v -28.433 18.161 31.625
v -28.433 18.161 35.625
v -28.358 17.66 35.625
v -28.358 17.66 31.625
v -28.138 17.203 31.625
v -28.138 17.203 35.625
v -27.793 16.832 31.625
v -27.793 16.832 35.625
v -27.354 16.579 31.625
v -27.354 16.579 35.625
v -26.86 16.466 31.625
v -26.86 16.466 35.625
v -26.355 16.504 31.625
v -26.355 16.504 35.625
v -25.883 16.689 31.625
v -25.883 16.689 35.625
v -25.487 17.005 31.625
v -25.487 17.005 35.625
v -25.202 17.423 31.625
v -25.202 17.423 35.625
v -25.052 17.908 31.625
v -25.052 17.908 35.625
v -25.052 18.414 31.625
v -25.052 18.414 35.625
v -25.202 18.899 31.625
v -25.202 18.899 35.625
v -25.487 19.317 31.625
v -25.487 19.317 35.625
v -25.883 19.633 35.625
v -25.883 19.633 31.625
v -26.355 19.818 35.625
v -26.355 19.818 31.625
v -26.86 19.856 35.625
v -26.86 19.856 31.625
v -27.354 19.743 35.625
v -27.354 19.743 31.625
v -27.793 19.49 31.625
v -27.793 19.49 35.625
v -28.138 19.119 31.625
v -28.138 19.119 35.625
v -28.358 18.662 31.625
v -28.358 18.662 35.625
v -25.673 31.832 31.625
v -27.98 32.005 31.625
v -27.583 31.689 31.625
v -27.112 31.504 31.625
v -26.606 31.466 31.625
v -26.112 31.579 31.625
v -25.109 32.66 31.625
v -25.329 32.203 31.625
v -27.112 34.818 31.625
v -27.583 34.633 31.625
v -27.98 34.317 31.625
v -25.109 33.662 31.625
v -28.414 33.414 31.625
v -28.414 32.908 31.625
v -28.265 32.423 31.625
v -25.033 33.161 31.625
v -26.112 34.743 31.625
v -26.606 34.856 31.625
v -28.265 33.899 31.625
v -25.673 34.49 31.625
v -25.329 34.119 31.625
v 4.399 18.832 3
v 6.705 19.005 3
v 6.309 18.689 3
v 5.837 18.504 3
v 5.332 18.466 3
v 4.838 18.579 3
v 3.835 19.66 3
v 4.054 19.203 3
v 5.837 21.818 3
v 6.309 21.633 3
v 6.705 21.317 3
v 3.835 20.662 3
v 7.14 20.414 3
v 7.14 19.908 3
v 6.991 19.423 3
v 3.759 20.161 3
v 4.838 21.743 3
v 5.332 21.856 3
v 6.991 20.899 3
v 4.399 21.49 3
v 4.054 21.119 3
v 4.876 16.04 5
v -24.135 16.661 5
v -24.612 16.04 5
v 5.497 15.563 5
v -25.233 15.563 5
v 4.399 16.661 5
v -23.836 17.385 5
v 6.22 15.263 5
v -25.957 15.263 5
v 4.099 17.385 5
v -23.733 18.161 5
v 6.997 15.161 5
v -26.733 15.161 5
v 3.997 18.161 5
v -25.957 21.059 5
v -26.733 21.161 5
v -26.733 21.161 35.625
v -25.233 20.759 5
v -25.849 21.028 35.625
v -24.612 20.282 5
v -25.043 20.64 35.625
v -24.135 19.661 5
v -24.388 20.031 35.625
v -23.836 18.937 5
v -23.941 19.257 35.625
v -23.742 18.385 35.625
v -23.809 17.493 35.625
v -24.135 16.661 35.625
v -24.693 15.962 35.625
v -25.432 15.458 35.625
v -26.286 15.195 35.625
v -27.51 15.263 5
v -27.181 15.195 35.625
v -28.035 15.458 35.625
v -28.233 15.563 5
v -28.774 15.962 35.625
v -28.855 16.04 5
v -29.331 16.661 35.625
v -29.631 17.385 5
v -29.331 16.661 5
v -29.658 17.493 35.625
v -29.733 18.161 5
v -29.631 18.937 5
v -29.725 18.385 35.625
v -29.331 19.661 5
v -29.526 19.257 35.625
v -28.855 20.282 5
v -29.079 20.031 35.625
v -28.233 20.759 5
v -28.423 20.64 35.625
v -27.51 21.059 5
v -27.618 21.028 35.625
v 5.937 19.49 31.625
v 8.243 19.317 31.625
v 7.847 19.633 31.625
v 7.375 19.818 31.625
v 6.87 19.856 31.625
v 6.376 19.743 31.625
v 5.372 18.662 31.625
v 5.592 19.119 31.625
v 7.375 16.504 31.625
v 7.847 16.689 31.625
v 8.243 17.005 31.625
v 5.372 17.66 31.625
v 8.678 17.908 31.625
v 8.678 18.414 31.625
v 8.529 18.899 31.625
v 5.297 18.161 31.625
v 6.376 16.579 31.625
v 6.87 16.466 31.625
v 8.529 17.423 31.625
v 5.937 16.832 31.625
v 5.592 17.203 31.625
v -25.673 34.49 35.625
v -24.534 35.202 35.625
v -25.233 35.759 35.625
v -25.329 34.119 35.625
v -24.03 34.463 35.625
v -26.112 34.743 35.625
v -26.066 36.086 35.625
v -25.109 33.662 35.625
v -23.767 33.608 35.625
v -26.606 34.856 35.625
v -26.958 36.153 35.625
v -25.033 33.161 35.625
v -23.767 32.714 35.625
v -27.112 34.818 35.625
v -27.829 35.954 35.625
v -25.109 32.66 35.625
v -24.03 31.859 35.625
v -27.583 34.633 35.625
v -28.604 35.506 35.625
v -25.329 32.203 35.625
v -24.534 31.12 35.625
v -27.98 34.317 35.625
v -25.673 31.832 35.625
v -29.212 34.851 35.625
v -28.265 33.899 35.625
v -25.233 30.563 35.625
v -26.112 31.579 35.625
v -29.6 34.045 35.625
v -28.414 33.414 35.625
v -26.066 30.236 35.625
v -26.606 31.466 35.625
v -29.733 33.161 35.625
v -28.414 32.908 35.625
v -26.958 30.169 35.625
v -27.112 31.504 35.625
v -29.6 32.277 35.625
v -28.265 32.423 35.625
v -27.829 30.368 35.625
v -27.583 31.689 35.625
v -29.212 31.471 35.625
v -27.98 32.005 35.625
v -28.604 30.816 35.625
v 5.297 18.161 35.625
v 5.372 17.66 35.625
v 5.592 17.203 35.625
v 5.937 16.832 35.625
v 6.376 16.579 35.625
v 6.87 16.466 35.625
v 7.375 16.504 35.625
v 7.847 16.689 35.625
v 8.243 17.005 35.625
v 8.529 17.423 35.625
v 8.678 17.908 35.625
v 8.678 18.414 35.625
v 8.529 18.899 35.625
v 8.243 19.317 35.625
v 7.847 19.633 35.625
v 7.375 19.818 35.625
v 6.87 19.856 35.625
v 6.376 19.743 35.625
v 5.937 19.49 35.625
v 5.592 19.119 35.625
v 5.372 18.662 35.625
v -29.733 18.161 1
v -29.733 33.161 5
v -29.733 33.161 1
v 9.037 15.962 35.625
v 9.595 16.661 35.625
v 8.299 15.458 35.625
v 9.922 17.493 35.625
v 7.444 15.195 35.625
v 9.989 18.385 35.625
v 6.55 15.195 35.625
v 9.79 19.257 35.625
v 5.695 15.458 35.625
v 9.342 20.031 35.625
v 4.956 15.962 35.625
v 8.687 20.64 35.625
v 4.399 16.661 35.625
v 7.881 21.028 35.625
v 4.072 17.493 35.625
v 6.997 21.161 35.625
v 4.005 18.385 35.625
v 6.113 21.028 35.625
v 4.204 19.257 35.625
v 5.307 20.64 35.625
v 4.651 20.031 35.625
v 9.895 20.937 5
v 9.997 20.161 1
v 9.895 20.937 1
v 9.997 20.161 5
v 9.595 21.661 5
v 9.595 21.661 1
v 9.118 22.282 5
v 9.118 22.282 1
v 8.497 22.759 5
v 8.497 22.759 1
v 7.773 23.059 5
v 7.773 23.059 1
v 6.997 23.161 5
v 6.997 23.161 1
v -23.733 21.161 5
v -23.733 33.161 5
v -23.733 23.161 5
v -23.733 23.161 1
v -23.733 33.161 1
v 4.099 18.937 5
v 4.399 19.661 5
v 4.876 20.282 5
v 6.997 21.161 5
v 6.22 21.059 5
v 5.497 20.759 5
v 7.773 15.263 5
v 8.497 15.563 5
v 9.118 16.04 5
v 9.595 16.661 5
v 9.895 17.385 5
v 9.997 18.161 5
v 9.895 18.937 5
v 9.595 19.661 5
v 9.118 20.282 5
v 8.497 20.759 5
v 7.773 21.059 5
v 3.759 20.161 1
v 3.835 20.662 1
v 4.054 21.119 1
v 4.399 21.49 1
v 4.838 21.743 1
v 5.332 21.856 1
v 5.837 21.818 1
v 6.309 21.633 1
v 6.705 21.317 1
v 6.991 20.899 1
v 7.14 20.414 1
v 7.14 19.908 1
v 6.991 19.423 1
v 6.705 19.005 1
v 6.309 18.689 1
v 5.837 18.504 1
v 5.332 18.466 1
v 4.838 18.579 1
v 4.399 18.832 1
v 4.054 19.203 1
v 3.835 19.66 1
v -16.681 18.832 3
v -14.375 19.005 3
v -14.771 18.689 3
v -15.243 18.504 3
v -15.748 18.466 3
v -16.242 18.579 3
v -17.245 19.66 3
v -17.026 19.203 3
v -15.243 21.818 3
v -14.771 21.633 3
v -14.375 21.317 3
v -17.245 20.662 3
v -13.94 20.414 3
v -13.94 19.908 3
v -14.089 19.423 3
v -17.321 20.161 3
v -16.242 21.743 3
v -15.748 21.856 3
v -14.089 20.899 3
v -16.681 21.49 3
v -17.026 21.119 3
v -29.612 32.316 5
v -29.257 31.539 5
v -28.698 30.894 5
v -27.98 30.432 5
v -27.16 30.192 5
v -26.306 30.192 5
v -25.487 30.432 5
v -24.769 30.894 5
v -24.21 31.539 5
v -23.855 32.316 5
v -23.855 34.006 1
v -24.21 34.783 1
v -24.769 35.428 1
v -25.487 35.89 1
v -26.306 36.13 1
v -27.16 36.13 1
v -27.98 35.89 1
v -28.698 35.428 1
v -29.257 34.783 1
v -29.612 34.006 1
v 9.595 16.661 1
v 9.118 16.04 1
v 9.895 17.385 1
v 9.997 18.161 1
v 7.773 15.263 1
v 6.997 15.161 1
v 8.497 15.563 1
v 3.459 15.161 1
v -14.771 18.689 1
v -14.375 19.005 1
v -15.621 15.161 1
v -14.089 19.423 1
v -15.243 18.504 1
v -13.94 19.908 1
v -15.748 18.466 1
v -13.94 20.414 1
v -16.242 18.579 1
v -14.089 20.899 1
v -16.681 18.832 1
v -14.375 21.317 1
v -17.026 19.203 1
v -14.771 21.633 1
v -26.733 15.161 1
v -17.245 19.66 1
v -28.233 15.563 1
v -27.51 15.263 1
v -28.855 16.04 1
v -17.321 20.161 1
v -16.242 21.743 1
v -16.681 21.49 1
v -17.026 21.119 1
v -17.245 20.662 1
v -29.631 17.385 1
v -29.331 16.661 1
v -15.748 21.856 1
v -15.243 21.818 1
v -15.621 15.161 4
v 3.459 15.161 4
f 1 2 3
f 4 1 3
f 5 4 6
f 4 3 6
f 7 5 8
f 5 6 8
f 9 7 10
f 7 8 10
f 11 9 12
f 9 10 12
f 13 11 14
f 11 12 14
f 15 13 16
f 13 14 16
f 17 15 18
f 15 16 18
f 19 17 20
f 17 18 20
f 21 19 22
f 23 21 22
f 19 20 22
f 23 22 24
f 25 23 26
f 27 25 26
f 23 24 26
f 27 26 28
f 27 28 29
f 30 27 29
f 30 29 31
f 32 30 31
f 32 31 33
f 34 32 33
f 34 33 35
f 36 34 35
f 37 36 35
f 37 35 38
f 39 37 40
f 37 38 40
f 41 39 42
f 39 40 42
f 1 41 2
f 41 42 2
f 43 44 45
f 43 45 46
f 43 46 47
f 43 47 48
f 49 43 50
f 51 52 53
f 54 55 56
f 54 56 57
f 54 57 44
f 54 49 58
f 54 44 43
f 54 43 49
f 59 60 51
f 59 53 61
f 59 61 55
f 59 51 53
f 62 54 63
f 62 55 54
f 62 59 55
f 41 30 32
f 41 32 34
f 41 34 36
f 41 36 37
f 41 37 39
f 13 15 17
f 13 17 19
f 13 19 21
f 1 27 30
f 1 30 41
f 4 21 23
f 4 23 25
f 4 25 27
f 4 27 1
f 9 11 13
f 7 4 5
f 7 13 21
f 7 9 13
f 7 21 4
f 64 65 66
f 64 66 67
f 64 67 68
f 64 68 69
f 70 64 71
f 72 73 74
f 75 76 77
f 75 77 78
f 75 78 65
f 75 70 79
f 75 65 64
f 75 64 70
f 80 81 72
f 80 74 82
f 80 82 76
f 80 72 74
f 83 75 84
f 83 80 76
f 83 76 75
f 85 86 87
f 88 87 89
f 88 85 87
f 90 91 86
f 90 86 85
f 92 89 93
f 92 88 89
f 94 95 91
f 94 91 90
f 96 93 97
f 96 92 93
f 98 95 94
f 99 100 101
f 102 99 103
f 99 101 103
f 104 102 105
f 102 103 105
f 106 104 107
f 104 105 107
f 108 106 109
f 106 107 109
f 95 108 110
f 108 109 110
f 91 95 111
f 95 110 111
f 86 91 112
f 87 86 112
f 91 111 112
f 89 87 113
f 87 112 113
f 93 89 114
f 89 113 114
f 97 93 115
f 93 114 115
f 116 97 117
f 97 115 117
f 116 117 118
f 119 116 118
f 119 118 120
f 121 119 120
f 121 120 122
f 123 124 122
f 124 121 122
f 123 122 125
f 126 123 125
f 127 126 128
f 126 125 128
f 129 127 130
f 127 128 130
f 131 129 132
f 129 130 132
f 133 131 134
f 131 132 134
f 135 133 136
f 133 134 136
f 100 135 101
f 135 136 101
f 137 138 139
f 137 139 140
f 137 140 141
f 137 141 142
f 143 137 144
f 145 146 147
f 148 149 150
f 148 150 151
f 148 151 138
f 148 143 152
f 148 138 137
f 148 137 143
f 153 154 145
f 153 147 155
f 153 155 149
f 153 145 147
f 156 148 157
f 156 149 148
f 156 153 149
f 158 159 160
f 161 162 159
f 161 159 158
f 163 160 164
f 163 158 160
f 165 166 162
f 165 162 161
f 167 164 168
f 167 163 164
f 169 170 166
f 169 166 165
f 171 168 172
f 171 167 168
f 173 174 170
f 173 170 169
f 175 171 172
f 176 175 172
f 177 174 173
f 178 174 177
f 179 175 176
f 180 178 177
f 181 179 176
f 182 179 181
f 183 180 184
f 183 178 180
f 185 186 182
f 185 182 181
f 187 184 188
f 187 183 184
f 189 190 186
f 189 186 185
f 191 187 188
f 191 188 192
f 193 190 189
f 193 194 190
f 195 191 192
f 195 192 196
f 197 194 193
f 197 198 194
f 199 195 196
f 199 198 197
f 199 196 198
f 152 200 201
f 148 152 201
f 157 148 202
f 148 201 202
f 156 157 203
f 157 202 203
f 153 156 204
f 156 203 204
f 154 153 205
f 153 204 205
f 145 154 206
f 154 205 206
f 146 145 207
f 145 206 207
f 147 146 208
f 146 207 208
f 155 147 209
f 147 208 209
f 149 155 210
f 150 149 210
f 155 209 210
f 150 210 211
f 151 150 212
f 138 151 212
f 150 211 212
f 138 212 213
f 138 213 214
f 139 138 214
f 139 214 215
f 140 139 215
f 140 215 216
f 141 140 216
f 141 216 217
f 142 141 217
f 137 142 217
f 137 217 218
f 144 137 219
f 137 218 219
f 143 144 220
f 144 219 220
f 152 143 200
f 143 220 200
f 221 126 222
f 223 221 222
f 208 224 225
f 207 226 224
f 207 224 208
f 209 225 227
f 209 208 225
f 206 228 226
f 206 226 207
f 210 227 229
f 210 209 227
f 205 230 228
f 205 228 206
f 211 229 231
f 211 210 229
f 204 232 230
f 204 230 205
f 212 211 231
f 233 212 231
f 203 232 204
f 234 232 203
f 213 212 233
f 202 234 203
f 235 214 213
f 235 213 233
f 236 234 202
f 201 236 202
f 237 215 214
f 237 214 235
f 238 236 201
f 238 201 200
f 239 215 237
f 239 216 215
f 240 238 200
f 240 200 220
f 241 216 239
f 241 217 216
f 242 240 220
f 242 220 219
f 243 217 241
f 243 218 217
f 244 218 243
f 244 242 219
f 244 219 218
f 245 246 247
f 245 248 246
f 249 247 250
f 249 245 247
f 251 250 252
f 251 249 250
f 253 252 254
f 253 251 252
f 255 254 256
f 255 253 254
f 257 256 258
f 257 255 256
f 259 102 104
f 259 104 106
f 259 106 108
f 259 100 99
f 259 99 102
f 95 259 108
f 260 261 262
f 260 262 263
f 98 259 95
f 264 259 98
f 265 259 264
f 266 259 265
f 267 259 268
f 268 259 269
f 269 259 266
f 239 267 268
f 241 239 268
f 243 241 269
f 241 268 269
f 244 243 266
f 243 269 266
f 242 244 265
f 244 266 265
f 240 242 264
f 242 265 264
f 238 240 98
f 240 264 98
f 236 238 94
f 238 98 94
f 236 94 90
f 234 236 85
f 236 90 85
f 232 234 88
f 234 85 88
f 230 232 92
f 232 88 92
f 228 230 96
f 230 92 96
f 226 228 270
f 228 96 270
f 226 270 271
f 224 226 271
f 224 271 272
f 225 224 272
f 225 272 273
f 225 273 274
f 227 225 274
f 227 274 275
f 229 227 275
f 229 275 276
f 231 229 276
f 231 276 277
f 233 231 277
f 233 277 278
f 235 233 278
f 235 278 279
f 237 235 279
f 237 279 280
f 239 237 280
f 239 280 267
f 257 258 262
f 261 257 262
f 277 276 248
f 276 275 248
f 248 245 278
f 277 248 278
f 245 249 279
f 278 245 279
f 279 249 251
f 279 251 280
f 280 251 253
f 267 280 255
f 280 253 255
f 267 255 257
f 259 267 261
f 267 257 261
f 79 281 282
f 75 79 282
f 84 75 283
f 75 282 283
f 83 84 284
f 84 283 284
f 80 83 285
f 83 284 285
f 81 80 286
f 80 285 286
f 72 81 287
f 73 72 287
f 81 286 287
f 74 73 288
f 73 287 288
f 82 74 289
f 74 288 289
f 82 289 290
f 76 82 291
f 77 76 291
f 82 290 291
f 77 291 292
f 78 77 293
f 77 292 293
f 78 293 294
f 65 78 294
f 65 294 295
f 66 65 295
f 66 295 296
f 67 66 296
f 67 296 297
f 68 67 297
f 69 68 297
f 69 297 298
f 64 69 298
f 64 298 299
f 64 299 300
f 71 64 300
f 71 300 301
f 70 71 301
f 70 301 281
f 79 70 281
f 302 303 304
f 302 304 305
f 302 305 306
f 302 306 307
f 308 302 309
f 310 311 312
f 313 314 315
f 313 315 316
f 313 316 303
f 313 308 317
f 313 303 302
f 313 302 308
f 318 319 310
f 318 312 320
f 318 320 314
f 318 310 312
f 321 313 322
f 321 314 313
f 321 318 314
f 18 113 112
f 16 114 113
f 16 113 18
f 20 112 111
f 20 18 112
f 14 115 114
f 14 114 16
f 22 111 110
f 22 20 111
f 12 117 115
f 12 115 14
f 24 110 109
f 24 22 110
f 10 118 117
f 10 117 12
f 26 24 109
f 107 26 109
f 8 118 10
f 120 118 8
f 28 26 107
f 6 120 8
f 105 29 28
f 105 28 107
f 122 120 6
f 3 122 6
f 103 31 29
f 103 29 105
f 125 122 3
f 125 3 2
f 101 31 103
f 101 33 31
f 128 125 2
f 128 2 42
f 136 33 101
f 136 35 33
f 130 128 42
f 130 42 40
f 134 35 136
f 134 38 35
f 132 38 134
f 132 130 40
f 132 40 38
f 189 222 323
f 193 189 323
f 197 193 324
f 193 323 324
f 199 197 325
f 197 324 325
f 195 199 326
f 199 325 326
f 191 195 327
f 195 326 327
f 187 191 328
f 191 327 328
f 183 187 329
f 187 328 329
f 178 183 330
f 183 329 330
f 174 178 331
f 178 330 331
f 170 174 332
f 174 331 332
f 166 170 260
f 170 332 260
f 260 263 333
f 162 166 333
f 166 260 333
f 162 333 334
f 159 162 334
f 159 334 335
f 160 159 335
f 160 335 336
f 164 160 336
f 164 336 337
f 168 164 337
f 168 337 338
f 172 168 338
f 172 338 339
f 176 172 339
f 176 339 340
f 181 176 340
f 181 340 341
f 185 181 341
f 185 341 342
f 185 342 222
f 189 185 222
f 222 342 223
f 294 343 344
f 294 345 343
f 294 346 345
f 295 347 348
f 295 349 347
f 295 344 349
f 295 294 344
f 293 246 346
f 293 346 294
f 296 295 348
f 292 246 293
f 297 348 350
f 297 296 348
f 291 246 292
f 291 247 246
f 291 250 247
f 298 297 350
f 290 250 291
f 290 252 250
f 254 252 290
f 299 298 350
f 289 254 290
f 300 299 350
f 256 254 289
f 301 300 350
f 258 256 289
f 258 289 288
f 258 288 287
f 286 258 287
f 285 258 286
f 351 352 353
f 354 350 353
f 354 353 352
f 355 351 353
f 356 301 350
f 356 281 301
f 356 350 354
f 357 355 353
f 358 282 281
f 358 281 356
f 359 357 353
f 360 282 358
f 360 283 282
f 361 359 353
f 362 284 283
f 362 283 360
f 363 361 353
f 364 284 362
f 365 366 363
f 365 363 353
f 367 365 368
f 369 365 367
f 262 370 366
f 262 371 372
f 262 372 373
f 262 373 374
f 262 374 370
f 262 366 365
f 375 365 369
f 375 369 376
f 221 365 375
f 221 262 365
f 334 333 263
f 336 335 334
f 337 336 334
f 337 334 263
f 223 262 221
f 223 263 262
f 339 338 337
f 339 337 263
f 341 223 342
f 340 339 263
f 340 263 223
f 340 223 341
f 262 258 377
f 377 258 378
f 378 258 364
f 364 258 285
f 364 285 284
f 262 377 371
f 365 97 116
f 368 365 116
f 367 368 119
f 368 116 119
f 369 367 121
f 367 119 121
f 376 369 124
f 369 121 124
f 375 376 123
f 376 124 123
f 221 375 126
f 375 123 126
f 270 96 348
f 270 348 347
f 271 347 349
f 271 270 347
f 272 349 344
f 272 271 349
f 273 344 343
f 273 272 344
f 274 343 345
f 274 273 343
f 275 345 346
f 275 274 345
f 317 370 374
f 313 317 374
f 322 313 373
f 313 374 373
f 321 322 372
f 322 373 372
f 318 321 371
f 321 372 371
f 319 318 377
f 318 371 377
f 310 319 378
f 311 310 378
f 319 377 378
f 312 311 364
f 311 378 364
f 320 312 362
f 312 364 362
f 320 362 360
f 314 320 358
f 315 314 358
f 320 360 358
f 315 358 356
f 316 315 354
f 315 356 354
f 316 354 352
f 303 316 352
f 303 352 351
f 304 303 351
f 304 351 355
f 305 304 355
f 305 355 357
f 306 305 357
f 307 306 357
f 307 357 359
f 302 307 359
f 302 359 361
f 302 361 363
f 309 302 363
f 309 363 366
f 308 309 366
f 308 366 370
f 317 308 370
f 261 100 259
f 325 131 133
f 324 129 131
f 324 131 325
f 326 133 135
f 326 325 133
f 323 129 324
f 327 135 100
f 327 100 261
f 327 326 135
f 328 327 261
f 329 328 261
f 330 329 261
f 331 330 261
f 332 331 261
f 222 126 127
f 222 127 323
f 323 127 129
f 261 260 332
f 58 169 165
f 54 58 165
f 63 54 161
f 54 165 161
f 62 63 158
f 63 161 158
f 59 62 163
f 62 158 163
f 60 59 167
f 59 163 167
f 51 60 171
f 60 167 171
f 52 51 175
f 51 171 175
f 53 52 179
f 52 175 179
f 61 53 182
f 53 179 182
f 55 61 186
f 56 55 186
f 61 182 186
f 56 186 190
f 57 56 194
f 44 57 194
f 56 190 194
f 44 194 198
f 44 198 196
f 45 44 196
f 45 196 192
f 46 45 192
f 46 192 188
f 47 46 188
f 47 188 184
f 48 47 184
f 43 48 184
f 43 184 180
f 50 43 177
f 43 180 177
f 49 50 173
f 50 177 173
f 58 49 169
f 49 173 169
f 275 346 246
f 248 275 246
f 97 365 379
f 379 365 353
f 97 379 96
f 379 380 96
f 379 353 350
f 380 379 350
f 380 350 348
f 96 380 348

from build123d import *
from build123d.topology import SkipClean

# Parameters (mm, degrees)
SKIZZE1_R                         = 3
AUFSATZ_LINEAR_AUSTRAGEN1_DEPTH   = 4
AUFSATZ_LINEAR_AUSTRAGEN1_2_DEPTH = 4
AUFSATZ_LINEAR_START              = 1
SKIZZE2_W                         = 39.730311682
SKIZZE2_H                         = 6
AUFSATZ_LINEAR_AUSTRAGEN2_DEPTH   = 4
SKIZZE3_R                         = 3
AUFSATZ_LINEAR_AUSTRAGEN3_DEPTH   = 34.6252
SCHNITT_LINEAR_AUSTRAGEN1_DEPTH   = 56.942794256
SKIZZE11_W                        = 6
SKIZZE11_H                        = 15
AUFSATZ_LINEAR_AUSTRAGEN8_DEPTH   = 4
SKIZZE12_R                        = 1.7
SCHNITT_LINEAR_AUSTRAGEN6_DEPTH   = 4
SKIZZE14_W                        = 25.08
SKIZZE14_H                        = 6
SCHNITT_LINEAR_AUSTRAGEN8_DEPTH   = 59.228840184
SKIZZE15_W                        = 33.730311682
SKIZZE15_H                        = 5
AUFSATZ_LINEAR_AUSTRAGEN9_DEPTH   = 4
SKIZZE17_R                        = 1.7
SCHNITT_LINEAR_AUSTRAGEN9_DEPTH   = 2
VERRUNDUNG1_R                     = 3


with BuildPart() as part:
    # Skizze1 → Aufsatz-Linear austragen1 (new body)
    with BuildSketch(Plane.XY):
        with Locations((-15.621, 18.161)):
            Circle(SKIZZE1_R)
    extrude(amount=AUFSATZ_LINEAR_AUSTRAGEN1_DEPTH)



with BuildPart() as body_2:
    # Skizze1 → Aufsatz-Linear austragen1 2 (new body)
    with BuildSketch(Plane.XY):
        with Locations(Location((3.459, 18.161, 0), (0, 0, 180))):
            Circle(SKIZZE1_R)
    extrude(amount=AUFSATZ_LINEAR_AUSTRAGEN1_2_DEPTH)


with BuildPart() as part_1:
    add(part.part)

    add(body_2.part)  # Aufsatz-Linear austragen2 merges body 2
    # Skizze2 → Aufsatz-Linear austragen2 (add)
    with BuildSketch(Plane.XY.offset(AUFSATZ_LINEAR_START)):
        with Locations((-9.868250172, 18.161)):
            Rectangle(SKIZZE2_W, SKIZZE2_H)
    extrude(amount=AUFSATZ_LINEAR_AUSTRAGEN2_DEPTH)

    # Skizze3 → Aufsatz-Linear austragen3 (add)
    with BuildSketch(Plane.XY.offset(1)):
        with Locations(Location((-26.733406013, 18.161, 0), (0, 0, 90))):
            Circle(SKIZZE3_R)
        with Locations(Location((6.996905669, 18.161, 0), (0, 0, 90))):
            Circle(SKIZZE3_R)
        with Locations(Location((-26.733406013, 33.161, 0), (0, 0, 180))):
            Circle(SKIZZE3_R)
    extrude(amount=AUFSATZ_LINEAR_AUSTRAGEN3_DEPTH)


with BuildPart() as aufsatz_linear_austragen3_piece_1:
    # of the separate pieces the step leaves, piece 1, a body of its own (aufsatz_linear_austragen3_pieces)
    add(part_1.part.solids().sort_by_distance((-12.621, 18.161, 0))[0])

    # Skizze5 → Schnitt-Linear austragen1 (cut, through all)
    with SkipClean():  # the faces are left unmerged after this step: merging them gives an invalid solid
        with BuildSketch(Plane.XY.offset(5)):
            with BuildLine():
                Line((-26.733406013, 21.161), (-36.757848336, 21.161))
                Line((-36.757848336, 21.161), (-36.757848336, 15.161))
                Line((-36.757848336, 15.161), (-26.733406013, 15.161))
                ThreePointArc((-26.733406013, 15.161), (-29.733406013, 18.161), (-26.733406013, 21.161))
            make_face()
            with BuildLine():
                Line((17.021347992, 15.161), (6.996905669, 15.161))
                ThreePointArc((6.996905669, 15.161), (9.996905669, 18.161), (6.996905669, 21.161))
                Line((6.996905669, 21.161), (17.021347992, 21.161))
                Line((17.021347992, 21.161), (17.021347992, 15.161))
            make_face()
        extrude(amount=-SCHNITT_LINEAR_AUSTRAGEN1_DEPTH, mode=Mode.SUBTRACT)



with BuildPart() as aufsatz_linear_austragen3_piece_2:
    # of the separate pieces the step leaves, piece 2, a body of its own (aufsatz_linear_austragen3_pieces)
    add(part_1.part.solids().sort_by_distance((-29.733406013, 33.161, 1))[0])


with BuildPart() as aufsatz_linear_austragen3_piece_1_1:
    with SkipClean():  # the faces are left unmerged after this step: merging them gives an invalid solid
        add(aufsatz_linear_austragen3_piece_1.part)

        add(aufsatz_linear_austragen3_piece_2.part)  # Aufsatz-Linear austragen8 merges Aufsatz-Linear austragen3 piece 2
        # Skizze11 → Aufsatz-Linear austragen8 (add)
        with BuildSketch(Plane.XY.offset(5)):
            with Locations((-26.733406013, 25.661)):
                Rectangle(SKIZZE11_W, SKIZZE11_H)
        extrude(amount=-AUFSATZ_LINEAR_AUSTRAGEN8_DEPTH)

    # Skizze12 → Schnitt-Linear austragen6 (cut)
    with SkipClean():  # the faces are left unmerged after this step: merging them gives an invalid solid
        with BuildSketch(Plane.XY.offset(35.6252)):
            with Locations((-26.733406013, 33.161)):
                Circle(SKIZZE12_R)
            with Locations(Location((-26.733406013, 18.161, 0), (0, 0, 180))):
                Circle(SKIZZE12_R)
            with Locations(Location((6.996905669, 18.161, 0), (0, 0, 180))):
                Circle(SKIZZE12_R)
        extrude(amount=-SCHNITT_LINEAR_AUSTRAGEN6_DEPTH, mode=Mode.SUBTRACT)

    # Skizze14 → Schnitt-Linear austragen8 (cut, through all)
    with SkipClean():  # the faces are left unmerged after this step: merging them gives an invalid solid
        with BuildSketch(Plane(origin=(0, 0, 1), x_dir=(-1, 0, 0), z_dir=(0, 0, -1))):
            with Locations((6.081, 18.161)):
                Rectangle(SKIZZE14_W, SKIZZE14_H)
        extrude(amount=SCHNITT_LINEAR_AUSTRAGEN8_DEPTH, mode=Mode.SUBTRACT)

    # Skizze15 → Aufsatz-Linear austragen9 (add)
    with BuildSketch(Plane(origin=(0, 0, 1), x_dir=(-1, 0, 0), z_dir=(0, 0, -1))):
        with Locations((6.868250172, 20.661)):
            Rectangle(SKIZZE15_W, SKIZZE15_H)
    extrude(amount=-AUFSATZ_LINEAR_AUSTRAGEN9_DEPTH)

    # Skizze17 → Schnitt-Linear austragen9 (cut)
    with BuildSketch(Plane(origin=(0, 0, 1), x_dir=(-1, 0, 0), z_dir=(0, 0, -1))):
        with Locations((-5.459, 20.161)):
            Circle(SKIZZE17_R)
        with Locations((15.621, 20.161)):
            Circle(SKIZZE17_R)
    extrude(amount=-SCHNITT_LINEAR_AUSTRAGEN9_DEPTH, mode=Mode.SUBTRACT)

    # Verrundung1
    verrundung1_edges = [aufsatz_linear_austragen3_piece_1_1.edges().sort_by_distance(p)[0] for p in [
        (9.996905669, 23.161, 3),
    ]]
    fillet(verrundung1_edges, radius=VERRUNDUNG1_R)


solid = aufsatz_linear_austragen3_piece_1_1.part
